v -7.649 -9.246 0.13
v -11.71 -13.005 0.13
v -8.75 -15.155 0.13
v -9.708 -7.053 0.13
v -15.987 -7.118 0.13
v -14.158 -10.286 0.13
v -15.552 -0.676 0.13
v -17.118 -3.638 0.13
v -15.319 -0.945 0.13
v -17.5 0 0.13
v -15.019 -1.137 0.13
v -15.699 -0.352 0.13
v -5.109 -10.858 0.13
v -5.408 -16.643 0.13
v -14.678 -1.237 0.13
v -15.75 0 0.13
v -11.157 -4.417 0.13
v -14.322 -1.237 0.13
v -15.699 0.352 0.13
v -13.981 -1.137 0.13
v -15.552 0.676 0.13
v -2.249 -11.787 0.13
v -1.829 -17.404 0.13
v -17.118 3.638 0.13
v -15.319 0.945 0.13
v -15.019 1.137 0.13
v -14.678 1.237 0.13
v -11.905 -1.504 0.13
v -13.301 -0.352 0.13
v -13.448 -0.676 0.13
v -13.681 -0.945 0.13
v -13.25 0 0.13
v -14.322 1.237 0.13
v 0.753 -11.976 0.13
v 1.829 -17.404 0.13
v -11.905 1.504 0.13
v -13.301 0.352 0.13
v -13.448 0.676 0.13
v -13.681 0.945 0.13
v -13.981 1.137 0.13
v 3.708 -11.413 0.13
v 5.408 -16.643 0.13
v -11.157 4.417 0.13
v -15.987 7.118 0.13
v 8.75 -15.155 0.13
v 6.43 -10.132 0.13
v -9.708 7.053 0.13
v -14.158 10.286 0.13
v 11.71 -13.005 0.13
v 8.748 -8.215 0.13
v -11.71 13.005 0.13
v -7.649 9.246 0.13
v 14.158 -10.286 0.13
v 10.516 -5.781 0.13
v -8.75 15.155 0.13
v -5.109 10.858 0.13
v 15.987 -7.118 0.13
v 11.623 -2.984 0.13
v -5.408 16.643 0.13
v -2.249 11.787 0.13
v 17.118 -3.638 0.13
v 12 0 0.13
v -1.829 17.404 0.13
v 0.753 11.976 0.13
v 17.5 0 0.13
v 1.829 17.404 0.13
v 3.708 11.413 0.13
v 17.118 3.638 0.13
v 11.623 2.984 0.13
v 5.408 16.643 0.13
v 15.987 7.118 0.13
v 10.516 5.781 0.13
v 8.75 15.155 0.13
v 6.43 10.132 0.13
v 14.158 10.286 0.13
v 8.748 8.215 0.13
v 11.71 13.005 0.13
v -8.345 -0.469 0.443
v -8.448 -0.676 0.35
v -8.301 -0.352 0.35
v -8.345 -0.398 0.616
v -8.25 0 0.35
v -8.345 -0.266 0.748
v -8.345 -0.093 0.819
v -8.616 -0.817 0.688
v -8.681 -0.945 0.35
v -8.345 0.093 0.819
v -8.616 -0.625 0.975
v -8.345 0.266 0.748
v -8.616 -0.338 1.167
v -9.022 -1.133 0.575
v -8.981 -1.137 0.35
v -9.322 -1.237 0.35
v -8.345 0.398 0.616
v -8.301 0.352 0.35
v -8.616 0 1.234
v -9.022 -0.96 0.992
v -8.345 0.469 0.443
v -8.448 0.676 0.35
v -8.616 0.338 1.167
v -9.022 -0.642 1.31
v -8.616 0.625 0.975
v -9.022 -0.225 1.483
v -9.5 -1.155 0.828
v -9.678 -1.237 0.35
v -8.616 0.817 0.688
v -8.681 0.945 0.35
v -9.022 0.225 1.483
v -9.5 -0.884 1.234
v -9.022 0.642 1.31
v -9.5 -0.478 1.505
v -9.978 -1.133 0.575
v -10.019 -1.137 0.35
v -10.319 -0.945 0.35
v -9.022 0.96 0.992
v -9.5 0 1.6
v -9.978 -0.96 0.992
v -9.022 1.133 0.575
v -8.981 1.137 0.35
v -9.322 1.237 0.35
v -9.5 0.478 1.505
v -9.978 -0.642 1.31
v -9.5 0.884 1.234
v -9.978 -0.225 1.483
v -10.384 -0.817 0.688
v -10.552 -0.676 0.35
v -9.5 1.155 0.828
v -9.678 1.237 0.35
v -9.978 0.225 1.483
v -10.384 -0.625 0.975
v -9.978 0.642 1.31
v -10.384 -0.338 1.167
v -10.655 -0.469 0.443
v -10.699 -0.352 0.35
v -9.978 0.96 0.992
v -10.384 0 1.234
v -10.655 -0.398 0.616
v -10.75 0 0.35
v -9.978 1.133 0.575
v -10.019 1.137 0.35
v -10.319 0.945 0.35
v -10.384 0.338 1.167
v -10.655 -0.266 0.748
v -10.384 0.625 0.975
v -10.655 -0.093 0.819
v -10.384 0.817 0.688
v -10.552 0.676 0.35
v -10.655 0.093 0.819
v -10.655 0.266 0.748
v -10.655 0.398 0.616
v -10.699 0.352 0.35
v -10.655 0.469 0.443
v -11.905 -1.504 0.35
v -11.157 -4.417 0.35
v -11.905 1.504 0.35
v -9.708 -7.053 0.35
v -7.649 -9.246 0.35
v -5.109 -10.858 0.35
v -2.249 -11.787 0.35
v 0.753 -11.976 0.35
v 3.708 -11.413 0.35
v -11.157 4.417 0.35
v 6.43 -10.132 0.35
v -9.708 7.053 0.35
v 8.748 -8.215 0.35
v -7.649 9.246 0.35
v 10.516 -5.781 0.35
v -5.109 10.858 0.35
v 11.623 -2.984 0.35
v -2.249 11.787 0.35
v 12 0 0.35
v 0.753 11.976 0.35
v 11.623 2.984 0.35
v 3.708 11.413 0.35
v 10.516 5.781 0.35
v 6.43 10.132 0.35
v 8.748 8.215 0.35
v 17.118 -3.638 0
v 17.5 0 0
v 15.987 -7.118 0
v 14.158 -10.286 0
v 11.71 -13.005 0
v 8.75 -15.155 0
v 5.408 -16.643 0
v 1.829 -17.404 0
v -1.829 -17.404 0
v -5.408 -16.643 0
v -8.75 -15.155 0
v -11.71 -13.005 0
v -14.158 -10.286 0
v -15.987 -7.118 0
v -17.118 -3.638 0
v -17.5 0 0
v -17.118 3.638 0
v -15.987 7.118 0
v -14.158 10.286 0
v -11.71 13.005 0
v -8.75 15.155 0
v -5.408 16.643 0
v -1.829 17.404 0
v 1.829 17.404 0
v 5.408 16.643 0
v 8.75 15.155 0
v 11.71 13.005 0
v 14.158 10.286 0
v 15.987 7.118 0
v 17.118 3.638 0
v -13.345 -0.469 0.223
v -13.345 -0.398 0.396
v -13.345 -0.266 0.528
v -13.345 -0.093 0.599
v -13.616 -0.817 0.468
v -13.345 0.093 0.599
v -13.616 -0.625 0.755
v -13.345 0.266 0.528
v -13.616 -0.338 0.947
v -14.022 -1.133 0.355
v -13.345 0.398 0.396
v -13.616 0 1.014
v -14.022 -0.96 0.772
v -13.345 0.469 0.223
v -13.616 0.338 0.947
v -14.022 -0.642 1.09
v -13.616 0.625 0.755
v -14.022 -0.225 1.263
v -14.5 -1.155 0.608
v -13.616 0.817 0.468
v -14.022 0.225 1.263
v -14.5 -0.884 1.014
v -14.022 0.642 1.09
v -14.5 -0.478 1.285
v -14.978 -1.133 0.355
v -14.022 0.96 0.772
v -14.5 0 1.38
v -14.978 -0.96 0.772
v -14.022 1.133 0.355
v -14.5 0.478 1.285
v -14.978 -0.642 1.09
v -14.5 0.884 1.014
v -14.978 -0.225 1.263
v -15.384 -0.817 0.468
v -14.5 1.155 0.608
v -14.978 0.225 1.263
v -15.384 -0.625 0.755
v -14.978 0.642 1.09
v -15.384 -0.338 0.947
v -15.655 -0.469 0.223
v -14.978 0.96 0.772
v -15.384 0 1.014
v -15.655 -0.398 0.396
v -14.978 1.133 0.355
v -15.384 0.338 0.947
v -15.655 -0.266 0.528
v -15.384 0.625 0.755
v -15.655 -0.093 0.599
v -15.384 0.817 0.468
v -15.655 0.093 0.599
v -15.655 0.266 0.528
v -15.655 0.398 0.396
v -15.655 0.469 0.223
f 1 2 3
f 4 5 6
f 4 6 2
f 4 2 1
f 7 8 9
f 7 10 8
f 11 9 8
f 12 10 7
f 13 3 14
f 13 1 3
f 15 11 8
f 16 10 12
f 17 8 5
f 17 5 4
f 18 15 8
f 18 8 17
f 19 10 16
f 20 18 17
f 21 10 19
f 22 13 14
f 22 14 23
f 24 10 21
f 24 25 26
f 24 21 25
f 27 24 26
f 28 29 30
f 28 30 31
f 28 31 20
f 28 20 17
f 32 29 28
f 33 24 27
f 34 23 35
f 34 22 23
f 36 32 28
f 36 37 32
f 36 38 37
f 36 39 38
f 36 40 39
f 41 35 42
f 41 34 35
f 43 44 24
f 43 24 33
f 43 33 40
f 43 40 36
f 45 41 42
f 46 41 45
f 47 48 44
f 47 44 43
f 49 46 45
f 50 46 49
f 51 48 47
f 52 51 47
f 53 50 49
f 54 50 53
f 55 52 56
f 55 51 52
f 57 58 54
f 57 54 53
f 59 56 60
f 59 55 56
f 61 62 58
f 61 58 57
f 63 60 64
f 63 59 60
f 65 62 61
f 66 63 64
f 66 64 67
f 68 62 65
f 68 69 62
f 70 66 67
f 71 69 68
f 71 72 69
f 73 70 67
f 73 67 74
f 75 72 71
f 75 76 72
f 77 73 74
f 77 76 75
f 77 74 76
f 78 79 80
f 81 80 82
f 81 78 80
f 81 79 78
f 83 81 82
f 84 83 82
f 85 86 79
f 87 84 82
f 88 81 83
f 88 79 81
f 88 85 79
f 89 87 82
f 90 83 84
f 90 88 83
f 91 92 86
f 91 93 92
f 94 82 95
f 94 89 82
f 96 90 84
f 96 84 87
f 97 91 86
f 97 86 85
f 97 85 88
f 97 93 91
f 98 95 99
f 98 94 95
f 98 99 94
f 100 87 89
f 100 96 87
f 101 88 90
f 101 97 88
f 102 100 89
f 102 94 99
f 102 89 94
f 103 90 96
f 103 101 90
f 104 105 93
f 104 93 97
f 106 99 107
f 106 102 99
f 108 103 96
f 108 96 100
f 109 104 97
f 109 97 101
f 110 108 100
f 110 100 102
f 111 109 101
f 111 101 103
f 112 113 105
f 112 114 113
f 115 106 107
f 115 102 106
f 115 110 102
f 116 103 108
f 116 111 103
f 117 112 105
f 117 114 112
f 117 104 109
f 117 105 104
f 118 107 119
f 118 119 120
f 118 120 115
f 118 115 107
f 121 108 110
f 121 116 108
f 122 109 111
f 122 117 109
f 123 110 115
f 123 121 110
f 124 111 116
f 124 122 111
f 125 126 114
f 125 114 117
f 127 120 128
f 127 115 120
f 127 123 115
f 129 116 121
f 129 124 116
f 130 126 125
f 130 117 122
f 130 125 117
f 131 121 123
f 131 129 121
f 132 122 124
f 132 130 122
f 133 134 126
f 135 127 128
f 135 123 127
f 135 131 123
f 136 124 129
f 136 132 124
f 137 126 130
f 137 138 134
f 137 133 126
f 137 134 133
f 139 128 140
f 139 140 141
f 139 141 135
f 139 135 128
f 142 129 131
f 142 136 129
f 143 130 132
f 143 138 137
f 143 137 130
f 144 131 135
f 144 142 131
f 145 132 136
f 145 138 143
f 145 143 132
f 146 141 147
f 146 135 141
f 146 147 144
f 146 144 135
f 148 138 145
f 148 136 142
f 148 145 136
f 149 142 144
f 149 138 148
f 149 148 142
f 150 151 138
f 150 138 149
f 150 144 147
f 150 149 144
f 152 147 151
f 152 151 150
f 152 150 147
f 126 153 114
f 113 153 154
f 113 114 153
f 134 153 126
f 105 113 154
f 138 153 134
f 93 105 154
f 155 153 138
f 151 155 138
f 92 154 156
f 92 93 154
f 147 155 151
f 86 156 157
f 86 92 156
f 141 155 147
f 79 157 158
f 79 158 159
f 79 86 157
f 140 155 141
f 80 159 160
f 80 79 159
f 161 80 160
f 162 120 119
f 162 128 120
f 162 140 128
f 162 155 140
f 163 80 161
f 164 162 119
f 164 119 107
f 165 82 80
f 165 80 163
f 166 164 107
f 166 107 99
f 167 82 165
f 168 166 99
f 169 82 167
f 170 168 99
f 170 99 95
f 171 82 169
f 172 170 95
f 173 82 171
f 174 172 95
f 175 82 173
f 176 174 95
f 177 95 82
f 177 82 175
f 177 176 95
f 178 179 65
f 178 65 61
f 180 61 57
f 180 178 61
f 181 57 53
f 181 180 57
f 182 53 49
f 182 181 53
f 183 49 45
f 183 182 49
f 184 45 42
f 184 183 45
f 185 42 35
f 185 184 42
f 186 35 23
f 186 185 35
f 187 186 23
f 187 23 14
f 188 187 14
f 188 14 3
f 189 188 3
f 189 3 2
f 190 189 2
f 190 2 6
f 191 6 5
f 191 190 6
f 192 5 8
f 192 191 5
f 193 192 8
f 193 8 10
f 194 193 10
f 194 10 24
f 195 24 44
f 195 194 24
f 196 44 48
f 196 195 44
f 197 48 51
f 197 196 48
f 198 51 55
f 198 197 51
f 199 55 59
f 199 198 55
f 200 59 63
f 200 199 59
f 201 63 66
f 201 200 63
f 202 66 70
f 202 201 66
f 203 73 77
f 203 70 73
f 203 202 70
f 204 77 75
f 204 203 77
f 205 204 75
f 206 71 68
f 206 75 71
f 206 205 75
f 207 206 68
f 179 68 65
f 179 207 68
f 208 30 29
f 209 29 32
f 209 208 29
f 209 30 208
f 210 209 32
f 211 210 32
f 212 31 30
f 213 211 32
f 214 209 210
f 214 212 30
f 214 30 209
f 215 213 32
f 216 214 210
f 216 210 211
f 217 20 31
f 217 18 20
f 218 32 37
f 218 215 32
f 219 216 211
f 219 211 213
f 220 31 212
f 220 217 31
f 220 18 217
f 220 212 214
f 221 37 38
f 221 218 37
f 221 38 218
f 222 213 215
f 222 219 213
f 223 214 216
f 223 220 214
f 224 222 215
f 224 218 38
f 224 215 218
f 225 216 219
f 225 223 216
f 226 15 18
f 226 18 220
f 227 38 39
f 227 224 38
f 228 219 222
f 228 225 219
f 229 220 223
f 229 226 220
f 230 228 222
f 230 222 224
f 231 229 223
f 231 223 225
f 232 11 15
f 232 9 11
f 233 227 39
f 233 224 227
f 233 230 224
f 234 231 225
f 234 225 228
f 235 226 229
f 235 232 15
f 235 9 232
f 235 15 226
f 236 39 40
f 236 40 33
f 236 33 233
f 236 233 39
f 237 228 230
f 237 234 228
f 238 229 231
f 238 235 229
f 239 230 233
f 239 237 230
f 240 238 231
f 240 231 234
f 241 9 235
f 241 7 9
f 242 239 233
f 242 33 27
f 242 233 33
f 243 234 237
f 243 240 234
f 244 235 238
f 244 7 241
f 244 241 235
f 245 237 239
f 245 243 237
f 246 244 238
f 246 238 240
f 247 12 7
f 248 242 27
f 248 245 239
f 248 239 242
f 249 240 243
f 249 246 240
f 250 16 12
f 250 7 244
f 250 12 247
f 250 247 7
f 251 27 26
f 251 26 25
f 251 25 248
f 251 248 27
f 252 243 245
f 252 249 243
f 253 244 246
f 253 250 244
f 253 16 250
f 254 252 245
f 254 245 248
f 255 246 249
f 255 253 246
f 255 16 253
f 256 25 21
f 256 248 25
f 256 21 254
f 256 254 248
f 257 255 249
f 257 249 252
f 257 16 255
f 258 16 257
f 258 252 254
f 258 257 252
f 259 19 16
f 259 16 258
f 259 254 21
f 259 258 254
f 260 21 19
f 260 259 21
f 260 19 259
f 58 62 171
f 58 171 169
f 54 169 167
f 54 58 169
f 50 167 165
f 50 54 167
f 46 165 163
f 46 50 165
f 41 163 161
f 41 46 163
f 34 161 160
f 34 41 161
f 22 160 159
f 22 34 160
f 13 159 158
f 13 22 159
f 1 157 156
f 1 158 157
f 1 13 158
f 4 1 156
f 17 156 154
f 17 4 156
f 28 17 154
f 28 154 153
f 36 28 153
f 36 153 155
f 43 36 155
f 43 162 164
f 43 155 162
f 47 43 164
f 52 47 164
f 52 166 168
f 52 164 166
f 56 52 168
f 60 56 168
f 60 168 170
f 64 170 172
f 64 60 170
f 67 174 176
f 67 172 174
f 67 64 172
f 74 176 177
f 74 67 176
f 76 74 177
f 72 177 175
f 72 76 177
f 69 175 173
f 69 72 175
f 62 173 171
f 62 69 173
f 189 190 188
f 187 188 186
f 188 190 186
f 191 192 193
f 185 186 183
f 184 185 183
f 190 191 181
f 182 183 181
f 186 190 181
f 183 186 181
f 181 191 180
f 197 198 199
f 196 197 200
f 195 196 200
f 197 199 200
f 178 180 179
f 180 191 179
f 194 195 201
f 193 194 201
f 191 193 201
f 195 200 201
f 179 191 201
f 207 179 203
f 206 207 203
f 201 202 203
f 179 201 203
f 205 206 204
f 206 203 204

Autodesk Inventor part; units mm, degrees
ref_plane "YZ Plane" through (0, 0, 0) normal (1, 0, 0) x (0, 1, 0)
ref_plane "XZ Plane" through (0, 0, 0) normal (0, 1, 0) x (-1, 0, 0)
ref_plane "XY Plane" through (0, 0, 0) normal (0, 0, 1) x (1, 0, 0)
sketch "Sketch1" plane through (0, 0, 0) normal (0, 0, 1) x (1, 0, 0)
  circle A0 centre (0, 0) radius 17.5
  dimension "d0" = 35
extrude "Extrusion1" add sketch "Sketch1" along normal blind 0.13
sketch "Sketch2" plane through (0, 0, 0.13) normal (0, 0, 1) x (1, 0, 0)
  circle A0 centre (0, 0) radius 12
  dimension "d3" = 24
extrude "Extrusion2" add sketch "Sketch2" along normal blind 0.22
sketch "Sketch3" plane through (0, 0, 0.13) normal (0, 0, 1) x (1, 0, 0)
  circle A0 centre (0, 0) radius 17.5 projected
  line L0 (-17.5, 0) -> (-14.5, 0)
  circle A1 centre (-14.5, 0) radius 1.25
  line L1 (-14.5, 0) -> (-13.25, 0)
  point P0 (-15.75, 0)
  dimension "d7" = 2.5
  dimension "d6" = 3
revolve "Revolution1" add sketch "Sketch3" angle 180 about axis through (-17.5, 0, 0.13) along (1, 0, 0) picked at (-14.1156, 0.7325) contours A1 L1 L0
sketch "Sketch4" plane through (0, 0, 0.35) normal (0, 0, 1) x (1, 0, 0)
  circle A0 centre (-14.5, 0) radius 1.25 projected
  circle A1 centre (0, 0) radius 12 projected
  circle A2 centre (0, 0) radius 17.5 projected
  circle A3 centre (0, 0) radius 17.5 projected
  line L0 (-17.5, 0) -> (-9.5, 0)
  circle A4 centre (-9.5, 0) radius 1.25
  line L1 (-9.5, 0) -> (-8.25, 0)
  point P0 (-10.75, 0)
  dimension "d10" = 2.5
  dimension "d9" = 8
revolve "Revolution2" add sketch "Sketch4" angle 180 about axis through (-17.5, 0, 0.35) along (1, 0, 0) picked at (-9.1156, 0.7325) contours A4 L1 L0
properties part number "Piezo"
